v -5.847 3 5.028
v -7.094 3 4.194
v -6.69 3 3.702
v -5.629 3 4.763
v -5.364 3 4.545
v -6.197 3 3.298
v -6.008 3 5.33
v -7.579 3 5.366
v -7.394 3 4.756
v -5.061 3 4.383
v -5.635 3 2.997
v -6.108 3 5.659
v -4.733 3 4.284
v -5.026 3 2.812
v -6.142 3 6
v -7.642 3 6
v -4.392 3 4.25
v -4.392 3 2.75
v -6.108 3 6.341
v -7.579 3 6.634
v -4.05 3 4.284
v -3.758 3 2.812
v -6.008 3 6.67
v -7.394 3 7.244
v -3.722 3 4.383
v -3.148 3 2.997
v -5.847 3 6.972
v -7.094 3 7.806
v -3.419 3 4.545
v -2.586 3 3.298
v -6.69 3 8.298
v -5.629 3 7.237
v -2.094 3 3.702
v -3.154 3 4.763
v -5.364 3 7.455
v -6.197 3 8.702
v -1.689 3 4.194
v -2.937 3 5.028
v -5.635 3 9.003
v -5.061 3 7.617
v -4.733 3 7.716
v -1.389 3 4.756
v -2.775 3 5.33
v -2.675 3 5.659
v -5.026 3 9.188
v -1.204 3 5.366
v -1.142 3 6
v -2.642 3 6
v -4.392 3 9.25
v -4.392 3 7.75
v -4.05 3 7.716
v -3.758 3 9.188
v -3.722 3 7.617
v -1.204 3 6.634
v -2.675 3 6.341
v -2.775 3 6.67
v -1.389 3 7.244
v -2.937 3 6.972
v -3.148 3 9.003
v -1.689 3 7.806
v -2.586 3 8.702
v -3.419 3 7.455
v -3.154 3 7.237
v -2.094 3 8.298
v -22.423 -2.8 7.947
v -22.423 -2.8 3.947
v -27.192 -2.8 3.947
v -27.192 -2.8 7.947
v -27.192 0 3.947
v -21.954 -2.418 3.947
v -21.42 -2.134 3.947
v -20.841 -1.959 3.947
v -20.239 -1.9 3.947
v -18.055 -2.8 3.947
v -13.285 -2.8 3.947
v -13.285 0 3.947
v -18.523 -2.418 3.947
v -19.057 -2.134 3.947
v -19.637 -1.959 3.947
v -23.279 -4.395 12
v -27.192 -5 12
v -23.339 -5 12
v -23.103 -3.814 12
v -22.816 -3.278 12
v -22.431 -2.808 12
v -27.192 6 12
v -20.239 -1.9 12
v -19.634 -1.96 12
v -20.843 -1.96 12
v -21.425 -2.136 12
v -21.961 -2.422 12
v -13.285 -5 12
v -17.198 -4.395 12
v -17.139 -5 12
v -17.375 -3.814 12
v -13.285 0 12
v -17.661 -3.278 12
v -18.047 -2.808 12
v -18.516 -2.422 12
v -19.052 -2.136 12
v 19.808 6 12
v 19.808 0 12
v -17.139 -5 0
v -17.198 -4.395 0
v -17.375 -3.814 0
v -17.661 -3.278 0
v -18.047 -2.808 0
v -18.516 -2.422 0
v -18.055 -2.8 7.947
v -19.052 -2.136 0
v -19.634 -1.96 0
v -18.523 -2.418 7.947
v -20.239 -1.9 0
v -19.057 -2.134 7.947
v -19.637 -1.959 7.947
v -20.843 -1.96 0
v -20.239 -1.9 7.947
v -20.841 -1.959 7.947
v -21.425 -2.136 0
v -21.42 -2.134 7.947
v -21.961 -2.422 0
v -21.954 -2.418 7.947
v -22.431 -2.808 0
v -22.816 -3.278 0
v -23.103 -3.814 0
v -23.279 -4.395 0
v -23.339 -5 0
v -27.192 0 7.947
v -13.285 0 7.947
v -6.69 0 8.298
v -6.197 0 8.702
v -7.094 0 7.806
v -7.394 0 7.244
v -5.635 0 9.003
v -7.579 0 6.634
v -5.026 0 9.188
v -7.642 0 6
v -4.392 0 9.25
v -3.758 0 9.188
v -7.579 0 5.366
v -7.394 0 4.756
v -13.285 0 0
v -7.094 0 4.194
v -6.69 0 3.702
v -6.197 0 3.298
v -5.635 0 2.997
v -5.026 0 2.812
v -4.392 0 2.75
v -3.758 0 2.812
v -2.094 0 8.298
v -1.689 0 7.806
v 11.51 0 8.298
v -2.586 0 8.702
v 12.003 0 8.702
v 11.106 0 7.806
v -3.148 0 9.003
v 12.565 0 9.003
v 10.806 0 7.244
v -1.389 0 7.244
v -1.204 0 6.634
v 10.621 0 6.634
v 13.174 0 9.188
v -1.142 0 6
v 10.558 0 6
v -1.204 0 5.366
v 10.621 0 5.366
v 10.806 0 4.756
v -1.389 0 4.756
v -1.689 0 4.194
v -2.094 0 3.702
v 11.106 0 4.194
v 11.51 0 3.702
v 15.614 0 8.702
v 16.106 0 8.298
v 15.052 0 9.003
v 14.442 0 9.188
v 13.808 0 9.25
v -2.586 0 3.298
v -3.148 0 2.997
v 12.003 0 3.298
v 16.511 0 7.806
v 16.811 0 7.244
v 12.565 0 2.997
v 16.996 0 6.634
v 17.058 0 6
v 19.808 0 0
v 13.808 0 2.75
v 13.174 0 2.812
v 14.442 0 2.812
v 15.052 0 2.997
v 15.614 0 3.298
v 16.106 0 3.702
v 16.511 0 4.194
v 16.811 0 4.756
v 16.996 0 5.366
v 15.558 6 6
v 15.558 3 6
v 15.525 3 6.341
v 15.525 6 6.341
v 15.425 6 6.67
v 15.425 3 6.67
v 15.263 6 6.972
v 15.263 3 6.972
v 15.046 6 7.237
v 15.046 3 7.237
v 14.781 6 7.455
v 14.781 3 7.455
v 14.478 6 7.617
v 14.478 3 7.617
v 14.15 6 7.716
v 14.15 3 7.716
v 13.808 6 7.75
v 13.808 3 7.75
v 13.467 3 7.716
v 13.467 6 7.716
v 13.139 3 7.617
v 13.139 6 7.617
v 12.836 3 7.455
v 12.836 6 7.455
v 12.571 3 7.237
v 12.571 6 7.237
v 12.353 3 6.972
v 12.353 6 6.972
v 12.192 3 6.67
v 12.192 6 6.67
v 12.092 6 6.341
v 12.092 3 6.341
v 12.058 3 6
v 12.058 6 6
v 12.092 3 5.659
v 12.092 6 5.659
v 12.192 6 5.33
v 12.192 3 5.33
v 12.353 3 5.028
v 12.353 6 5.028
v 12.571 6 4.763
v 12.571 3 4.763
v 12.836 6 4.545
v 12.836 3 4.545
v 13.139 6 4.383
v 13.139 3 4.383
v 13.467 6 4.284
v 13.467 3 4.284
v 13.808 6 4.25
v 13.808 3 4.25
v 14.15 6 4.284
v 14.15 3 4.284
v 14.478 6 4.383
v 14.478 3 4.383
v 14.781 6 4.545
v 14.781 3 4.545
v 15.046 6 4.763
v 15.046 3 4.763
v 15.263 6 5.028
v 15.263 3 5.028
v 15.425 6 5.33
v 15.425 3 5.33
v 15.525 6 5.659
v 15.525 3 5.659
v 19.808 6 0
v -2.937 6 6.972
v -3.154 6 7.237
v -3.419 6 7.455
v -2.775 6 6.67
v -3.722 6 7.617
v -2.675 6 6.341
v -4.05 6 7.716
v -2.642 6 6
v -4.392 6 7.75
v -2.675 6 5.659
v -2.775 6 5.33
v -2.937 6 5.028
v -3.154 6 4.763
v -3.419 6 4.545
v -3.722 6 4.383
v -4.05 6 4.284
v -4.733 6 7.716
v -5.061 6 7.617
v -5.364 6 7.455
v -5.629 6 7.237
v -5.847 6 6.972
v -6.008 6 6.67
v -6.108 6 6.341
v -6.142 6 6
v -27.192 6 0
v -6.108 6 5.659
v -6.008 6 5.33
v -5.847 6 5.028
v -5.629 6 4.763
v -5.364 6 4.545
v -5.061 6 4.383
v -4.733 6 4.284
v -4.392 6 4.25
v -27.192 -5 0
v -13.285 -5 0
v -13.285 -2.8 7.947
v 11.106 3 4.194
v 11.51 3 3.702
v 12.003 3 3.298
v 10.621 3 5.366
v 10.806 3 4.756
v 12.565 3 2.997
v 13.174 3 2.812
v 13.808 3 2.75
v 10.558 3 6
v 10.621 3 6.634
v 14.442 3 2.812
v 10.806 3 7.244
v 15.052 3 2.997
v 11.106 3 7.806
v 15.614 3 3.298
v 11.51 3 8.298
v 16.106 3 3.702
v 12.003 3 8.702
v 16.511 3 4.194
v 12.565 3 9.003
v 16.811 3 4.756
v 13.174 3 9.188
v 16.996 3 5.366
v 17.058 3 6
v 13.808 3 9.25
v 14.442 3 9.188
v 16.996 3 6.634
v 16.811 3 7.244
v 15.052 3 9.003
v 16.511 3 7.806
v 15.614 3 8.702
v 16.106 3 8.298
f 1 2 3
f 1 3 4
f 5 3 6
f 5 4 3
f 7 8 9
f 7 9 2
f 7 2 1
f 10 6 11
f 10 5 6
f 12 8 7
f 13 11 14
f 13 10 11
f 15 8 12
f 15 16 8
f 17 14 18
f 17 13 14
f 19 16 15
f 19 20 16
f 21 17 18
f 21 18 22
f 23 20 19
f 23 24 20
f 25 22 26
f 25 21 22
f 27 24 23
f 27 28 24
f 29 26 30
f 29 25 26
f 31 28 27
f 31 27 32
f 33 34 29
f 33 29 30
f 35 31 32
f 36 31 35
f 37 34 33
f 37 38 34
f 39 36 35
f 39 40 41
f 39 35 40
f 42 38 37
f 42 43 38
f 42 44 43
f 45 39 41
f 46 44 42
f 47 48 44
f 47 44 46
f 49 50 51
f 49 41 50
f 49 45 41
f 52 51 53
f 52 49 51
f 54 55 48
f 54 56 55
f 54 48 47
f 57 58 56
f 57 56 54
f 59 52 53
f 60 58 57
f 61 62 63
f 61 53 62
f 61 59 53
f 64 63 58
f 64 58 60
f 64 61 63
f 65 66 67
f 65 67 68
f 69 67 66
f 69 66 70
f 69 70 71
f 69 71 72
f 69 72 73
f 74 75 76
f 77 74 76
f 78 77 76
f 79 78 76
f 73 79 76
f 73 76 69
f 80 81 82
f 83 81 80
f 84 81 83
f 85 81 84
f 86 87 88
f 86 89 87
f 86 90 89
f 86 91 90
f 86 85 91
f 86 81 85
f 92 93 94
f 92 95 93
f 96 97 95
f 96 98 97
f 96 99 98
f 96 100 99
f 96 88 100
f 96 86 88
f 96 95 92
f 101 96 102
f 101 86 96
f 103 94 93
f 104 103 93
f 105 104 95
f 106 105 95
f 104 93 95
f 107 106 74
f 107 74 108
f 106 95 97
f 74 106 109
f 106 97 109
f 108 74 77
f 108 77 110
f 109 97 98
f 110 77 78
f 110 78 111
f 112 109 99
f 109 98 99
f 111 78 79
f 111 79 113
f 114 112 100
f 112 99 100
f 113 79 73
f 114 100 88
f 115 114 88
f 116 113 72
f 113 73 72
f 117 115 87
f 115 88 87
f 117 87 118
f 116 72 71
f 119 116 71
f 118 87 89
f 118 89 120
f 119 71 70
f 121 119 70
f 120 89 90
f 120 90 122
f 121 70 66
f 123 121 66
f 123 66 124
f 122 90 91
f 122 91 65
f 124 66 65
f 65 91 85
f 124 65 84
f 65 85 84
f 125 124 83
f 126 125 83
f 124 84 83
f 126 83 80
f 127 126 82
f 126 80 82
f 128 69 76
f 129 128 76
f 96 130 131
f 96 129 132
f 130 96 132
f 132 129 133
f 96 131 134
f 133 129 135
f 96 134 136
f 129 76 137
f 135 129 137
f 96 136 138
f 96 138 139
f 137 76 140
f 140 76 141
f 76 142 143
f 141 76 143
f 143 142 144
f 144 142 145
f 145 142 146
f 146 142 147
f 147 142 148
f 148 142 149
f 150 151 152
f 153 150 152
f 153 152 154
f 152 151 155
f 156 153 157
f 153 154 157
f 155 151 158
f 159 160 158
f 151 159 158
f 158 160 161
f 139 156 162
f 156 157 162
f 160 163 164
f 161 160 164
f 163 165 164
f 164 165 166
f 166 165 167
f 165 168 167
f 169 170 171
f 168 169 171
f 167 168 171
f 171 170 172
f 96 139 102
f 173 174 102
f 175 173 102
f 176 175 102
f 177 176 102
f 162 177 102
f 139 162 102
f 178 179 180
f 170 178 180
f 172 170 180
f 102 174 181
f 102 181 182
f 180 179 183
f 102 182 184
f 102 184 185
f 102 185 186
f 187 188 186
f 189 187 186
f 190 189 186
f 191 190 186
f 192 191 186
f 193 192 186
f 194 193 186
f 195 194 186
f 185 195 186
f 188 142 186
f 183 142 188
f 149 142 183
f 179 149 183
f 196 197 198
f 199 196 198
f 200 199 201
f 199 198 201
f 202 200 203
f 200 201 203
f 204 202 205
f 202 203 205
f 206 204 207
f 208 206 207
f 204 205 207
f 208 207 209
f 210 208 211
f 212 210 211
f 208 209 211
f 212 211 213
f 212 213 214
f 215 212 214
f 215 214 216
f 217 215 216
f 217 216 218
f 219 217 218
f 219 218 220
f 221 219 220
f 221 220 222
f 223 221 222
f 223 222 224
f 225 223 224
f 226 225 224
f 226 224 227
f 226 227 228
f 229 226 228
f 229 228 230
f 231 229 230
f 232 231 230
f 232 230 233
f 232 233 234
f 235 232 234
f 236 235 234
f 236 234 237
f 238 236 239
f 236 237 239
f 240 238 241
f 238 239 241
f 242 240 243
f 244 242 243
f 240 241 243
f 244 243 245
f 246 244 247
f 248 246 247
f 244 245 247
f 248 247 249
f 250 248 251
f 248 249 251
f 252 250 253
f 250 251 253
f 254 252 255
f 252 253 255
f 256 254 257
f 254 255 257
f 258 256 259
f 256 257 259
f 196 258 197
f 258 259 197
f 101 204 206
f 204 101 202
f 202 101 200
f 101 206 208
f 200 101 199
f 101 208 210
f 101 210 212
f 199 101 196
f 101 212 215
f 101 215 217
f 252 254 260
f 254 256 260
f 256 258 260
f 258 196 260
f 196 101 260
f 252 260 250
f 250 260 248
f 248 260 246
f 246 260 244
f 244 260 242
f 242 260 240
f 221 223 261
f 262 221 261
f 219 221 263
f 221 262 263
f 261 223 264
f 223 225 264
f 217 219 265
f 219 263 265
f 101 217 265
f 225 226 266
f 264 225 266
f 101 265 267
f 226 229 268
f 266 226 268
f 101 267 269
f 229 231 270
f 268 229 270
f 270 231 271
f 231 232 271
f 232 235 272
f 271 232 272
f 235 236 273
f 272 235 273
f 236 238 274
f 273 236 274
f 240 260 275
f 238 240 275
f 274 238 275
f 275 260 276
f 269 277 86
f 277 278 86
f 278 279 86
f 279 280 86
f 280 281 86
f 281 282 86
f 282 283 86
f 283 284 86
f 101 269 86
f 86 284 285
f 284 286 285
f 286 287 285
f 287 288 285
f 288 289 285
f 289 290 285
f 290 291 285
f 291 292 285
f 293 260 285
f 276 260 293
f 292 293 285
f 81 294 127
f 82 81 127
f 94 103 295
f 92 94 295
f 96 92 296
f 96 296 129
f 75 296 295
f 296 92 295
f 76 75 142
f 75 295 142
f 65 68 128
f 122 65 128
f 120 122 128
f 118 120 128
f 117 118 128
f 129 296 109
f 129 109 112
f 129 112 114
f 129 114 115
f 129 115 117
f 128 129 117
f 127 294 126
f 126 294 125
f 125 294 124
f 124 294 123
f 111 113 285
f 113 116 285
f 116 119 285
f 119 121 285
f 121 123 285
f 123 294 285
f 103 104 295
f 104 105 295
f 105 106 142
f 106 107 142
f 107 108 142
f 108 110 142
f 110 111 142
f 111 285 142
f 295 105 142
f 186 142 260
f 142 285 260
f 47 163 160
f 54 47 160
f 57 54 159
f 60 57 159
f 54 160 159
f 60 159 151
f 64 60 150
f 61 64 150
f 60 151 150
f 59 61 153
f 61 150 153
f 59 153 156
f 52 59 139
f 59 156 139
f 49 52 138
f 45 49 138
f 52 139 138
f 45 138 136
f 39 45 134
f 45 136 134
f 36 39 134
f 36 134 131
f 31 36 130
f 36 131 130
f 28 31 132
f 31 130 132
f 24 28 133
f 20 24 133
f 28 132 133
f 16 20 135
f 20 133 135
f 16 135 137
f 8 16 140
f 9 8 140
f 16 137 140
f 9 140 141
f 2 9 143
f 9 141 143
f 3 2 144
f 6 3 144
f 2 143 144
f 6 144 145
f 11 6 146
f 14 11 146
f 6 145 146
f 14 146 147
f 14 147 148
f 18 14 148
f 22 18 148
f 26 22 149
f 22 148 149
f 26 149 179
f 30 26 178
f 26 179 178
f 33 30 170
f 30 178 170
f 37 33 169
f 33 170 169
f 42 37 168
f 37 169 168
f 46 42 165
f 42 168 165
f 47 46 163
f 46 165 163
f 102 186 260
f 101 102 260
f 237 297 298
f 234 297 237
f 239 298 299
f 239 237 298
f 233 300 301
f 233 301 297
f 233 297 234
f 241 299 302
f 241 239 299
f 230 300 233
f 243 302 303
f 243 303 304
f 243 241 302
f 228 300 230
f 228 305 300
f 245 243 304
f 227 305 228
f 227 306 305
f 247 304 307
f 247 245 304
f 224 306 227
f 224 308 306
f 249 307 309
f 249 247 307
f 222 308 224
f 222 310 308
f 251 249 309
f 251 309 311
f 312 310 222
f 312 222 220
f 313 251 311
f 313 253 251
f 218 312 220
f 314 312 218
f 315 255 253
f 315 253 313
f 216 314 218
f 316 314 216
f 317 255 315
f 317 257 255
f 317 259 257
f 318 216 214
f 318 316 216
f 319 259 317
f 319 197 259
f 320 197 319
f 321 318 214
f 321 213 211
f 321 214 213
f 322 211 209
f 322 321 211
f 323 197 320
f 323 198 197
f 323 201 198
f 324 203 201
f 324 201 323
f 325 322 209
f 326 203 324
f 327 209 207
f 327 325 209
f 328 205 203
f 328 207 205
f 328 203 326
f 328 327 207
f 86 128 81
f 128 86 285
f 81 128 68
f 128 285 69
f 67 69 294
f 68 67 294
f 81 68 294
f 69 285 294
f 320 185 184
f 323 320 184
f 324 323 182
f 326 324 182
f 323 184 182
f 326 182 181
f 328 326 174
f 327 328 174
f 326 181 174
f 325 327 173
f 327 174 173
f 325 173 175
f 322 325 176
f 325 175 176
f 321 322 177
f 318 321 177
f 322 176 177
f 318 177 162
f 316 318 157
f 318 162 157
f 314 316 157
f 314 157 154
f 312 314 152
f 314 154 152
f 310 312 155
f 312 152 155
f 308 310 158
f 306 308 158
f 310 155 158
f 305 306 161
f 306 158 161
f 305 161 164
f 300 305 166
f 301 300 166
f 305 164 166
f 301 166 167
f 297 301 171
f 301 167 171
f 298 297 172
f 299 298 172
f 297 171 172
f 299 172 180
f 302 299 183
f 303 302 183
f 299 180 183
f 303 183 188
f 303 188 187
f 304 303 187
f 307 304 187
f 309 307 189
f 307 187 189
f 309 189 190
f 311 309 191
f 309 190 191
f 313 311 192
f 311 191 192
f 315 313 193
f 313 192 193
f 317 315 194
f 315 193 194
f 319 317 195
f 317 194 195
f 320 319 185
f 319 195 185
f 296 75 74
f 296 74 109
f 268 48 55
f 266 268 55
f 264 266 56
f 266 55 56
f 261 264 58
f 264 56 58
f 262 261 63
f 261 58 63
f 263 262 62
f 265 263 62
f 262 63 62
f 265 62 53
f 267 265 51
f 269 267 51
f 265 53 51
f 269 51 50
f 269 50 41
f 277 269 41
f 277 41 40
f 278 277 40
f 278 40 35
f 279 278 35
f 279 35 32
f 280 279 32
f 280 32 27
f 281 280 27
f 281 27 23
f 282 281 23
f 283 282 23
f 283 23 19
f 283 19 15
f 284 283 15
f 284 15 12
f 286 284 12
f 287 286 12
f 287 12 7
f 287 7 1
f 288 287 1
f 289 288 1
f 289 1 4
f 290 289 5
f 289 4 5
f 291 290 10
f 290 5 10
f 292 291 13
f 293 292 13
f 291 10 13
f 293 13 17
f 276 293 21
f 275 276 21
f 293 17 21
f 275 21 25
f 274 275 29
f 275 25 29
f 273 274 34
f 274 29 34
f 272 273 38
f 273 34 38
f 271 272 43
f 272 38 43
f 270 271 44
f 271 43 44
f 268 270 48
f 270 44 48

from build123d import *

# Parameters (mm, degrees)
F1_DEPTH = 12
F2_R     = 3.1
F3_DEPTH = 12.001
F4_R     = 1.75
F5_DEPTH = 6.001
F6_R     = 3.25
F7_DEPTH = 3
F8_W     = 2.8
F8_H     = 4
F9_DEPTH = 13.90725


with BuildPart() as f1:
    # F0 (on Top) → F1 (new body)
    with BuildSketch(Plane.XY):
        Polygon((-13.285446, 0), (19.808304, 0), (19.808304, 6), (-27.191696, 6), (-27.191696, -5), (-13.285446, -5), align=None)
    extrude(amount=F1_DEPTH)

    # F2 (on face) → F3 (cut, through all)
    with BuildSketch(Plane.XY.offset(12)):
        with Locations((-20.238571, -5)):
            Circle(F2_R)
    extrude(amount=-F3_DEPTH, mode=Mode.SUBTRACT)

    # F4 (on face) → F5 (cut, through all)
    with BuildSketch(Plane.XZ):
        with Locations((13.808304, 6)):
            Circle(F4_R)
        with Locations((-4.391696, 6)):
            Circle(F4_R)
    extrude(amount=-F5_DEPTH, mode=Mode.SUBTRACT)

    # F6 (on face) → F7 (cut)
    with BuildSketch(Plane.XZ):
        with Locations((-4.391696, 6)):
            Circle(F6_R)
        with Locations((13.808304, 6)):
            Circle(F6_R)
    extrude(amount=-F7_DEPTH, mode=Mode.SUBTRACT)

    # F8 (on face) → F9 (cut, through all)
    with BuildSketch(Plane.YZ.offset(-13.285446)):
        with Locations((-1.4, 5.94657)):
            Rectangle(F8_W, F8_H)
    extrude(amount=-F9_DEPTH, mode=Mode.SUBTRACT)


solid = f1.part
